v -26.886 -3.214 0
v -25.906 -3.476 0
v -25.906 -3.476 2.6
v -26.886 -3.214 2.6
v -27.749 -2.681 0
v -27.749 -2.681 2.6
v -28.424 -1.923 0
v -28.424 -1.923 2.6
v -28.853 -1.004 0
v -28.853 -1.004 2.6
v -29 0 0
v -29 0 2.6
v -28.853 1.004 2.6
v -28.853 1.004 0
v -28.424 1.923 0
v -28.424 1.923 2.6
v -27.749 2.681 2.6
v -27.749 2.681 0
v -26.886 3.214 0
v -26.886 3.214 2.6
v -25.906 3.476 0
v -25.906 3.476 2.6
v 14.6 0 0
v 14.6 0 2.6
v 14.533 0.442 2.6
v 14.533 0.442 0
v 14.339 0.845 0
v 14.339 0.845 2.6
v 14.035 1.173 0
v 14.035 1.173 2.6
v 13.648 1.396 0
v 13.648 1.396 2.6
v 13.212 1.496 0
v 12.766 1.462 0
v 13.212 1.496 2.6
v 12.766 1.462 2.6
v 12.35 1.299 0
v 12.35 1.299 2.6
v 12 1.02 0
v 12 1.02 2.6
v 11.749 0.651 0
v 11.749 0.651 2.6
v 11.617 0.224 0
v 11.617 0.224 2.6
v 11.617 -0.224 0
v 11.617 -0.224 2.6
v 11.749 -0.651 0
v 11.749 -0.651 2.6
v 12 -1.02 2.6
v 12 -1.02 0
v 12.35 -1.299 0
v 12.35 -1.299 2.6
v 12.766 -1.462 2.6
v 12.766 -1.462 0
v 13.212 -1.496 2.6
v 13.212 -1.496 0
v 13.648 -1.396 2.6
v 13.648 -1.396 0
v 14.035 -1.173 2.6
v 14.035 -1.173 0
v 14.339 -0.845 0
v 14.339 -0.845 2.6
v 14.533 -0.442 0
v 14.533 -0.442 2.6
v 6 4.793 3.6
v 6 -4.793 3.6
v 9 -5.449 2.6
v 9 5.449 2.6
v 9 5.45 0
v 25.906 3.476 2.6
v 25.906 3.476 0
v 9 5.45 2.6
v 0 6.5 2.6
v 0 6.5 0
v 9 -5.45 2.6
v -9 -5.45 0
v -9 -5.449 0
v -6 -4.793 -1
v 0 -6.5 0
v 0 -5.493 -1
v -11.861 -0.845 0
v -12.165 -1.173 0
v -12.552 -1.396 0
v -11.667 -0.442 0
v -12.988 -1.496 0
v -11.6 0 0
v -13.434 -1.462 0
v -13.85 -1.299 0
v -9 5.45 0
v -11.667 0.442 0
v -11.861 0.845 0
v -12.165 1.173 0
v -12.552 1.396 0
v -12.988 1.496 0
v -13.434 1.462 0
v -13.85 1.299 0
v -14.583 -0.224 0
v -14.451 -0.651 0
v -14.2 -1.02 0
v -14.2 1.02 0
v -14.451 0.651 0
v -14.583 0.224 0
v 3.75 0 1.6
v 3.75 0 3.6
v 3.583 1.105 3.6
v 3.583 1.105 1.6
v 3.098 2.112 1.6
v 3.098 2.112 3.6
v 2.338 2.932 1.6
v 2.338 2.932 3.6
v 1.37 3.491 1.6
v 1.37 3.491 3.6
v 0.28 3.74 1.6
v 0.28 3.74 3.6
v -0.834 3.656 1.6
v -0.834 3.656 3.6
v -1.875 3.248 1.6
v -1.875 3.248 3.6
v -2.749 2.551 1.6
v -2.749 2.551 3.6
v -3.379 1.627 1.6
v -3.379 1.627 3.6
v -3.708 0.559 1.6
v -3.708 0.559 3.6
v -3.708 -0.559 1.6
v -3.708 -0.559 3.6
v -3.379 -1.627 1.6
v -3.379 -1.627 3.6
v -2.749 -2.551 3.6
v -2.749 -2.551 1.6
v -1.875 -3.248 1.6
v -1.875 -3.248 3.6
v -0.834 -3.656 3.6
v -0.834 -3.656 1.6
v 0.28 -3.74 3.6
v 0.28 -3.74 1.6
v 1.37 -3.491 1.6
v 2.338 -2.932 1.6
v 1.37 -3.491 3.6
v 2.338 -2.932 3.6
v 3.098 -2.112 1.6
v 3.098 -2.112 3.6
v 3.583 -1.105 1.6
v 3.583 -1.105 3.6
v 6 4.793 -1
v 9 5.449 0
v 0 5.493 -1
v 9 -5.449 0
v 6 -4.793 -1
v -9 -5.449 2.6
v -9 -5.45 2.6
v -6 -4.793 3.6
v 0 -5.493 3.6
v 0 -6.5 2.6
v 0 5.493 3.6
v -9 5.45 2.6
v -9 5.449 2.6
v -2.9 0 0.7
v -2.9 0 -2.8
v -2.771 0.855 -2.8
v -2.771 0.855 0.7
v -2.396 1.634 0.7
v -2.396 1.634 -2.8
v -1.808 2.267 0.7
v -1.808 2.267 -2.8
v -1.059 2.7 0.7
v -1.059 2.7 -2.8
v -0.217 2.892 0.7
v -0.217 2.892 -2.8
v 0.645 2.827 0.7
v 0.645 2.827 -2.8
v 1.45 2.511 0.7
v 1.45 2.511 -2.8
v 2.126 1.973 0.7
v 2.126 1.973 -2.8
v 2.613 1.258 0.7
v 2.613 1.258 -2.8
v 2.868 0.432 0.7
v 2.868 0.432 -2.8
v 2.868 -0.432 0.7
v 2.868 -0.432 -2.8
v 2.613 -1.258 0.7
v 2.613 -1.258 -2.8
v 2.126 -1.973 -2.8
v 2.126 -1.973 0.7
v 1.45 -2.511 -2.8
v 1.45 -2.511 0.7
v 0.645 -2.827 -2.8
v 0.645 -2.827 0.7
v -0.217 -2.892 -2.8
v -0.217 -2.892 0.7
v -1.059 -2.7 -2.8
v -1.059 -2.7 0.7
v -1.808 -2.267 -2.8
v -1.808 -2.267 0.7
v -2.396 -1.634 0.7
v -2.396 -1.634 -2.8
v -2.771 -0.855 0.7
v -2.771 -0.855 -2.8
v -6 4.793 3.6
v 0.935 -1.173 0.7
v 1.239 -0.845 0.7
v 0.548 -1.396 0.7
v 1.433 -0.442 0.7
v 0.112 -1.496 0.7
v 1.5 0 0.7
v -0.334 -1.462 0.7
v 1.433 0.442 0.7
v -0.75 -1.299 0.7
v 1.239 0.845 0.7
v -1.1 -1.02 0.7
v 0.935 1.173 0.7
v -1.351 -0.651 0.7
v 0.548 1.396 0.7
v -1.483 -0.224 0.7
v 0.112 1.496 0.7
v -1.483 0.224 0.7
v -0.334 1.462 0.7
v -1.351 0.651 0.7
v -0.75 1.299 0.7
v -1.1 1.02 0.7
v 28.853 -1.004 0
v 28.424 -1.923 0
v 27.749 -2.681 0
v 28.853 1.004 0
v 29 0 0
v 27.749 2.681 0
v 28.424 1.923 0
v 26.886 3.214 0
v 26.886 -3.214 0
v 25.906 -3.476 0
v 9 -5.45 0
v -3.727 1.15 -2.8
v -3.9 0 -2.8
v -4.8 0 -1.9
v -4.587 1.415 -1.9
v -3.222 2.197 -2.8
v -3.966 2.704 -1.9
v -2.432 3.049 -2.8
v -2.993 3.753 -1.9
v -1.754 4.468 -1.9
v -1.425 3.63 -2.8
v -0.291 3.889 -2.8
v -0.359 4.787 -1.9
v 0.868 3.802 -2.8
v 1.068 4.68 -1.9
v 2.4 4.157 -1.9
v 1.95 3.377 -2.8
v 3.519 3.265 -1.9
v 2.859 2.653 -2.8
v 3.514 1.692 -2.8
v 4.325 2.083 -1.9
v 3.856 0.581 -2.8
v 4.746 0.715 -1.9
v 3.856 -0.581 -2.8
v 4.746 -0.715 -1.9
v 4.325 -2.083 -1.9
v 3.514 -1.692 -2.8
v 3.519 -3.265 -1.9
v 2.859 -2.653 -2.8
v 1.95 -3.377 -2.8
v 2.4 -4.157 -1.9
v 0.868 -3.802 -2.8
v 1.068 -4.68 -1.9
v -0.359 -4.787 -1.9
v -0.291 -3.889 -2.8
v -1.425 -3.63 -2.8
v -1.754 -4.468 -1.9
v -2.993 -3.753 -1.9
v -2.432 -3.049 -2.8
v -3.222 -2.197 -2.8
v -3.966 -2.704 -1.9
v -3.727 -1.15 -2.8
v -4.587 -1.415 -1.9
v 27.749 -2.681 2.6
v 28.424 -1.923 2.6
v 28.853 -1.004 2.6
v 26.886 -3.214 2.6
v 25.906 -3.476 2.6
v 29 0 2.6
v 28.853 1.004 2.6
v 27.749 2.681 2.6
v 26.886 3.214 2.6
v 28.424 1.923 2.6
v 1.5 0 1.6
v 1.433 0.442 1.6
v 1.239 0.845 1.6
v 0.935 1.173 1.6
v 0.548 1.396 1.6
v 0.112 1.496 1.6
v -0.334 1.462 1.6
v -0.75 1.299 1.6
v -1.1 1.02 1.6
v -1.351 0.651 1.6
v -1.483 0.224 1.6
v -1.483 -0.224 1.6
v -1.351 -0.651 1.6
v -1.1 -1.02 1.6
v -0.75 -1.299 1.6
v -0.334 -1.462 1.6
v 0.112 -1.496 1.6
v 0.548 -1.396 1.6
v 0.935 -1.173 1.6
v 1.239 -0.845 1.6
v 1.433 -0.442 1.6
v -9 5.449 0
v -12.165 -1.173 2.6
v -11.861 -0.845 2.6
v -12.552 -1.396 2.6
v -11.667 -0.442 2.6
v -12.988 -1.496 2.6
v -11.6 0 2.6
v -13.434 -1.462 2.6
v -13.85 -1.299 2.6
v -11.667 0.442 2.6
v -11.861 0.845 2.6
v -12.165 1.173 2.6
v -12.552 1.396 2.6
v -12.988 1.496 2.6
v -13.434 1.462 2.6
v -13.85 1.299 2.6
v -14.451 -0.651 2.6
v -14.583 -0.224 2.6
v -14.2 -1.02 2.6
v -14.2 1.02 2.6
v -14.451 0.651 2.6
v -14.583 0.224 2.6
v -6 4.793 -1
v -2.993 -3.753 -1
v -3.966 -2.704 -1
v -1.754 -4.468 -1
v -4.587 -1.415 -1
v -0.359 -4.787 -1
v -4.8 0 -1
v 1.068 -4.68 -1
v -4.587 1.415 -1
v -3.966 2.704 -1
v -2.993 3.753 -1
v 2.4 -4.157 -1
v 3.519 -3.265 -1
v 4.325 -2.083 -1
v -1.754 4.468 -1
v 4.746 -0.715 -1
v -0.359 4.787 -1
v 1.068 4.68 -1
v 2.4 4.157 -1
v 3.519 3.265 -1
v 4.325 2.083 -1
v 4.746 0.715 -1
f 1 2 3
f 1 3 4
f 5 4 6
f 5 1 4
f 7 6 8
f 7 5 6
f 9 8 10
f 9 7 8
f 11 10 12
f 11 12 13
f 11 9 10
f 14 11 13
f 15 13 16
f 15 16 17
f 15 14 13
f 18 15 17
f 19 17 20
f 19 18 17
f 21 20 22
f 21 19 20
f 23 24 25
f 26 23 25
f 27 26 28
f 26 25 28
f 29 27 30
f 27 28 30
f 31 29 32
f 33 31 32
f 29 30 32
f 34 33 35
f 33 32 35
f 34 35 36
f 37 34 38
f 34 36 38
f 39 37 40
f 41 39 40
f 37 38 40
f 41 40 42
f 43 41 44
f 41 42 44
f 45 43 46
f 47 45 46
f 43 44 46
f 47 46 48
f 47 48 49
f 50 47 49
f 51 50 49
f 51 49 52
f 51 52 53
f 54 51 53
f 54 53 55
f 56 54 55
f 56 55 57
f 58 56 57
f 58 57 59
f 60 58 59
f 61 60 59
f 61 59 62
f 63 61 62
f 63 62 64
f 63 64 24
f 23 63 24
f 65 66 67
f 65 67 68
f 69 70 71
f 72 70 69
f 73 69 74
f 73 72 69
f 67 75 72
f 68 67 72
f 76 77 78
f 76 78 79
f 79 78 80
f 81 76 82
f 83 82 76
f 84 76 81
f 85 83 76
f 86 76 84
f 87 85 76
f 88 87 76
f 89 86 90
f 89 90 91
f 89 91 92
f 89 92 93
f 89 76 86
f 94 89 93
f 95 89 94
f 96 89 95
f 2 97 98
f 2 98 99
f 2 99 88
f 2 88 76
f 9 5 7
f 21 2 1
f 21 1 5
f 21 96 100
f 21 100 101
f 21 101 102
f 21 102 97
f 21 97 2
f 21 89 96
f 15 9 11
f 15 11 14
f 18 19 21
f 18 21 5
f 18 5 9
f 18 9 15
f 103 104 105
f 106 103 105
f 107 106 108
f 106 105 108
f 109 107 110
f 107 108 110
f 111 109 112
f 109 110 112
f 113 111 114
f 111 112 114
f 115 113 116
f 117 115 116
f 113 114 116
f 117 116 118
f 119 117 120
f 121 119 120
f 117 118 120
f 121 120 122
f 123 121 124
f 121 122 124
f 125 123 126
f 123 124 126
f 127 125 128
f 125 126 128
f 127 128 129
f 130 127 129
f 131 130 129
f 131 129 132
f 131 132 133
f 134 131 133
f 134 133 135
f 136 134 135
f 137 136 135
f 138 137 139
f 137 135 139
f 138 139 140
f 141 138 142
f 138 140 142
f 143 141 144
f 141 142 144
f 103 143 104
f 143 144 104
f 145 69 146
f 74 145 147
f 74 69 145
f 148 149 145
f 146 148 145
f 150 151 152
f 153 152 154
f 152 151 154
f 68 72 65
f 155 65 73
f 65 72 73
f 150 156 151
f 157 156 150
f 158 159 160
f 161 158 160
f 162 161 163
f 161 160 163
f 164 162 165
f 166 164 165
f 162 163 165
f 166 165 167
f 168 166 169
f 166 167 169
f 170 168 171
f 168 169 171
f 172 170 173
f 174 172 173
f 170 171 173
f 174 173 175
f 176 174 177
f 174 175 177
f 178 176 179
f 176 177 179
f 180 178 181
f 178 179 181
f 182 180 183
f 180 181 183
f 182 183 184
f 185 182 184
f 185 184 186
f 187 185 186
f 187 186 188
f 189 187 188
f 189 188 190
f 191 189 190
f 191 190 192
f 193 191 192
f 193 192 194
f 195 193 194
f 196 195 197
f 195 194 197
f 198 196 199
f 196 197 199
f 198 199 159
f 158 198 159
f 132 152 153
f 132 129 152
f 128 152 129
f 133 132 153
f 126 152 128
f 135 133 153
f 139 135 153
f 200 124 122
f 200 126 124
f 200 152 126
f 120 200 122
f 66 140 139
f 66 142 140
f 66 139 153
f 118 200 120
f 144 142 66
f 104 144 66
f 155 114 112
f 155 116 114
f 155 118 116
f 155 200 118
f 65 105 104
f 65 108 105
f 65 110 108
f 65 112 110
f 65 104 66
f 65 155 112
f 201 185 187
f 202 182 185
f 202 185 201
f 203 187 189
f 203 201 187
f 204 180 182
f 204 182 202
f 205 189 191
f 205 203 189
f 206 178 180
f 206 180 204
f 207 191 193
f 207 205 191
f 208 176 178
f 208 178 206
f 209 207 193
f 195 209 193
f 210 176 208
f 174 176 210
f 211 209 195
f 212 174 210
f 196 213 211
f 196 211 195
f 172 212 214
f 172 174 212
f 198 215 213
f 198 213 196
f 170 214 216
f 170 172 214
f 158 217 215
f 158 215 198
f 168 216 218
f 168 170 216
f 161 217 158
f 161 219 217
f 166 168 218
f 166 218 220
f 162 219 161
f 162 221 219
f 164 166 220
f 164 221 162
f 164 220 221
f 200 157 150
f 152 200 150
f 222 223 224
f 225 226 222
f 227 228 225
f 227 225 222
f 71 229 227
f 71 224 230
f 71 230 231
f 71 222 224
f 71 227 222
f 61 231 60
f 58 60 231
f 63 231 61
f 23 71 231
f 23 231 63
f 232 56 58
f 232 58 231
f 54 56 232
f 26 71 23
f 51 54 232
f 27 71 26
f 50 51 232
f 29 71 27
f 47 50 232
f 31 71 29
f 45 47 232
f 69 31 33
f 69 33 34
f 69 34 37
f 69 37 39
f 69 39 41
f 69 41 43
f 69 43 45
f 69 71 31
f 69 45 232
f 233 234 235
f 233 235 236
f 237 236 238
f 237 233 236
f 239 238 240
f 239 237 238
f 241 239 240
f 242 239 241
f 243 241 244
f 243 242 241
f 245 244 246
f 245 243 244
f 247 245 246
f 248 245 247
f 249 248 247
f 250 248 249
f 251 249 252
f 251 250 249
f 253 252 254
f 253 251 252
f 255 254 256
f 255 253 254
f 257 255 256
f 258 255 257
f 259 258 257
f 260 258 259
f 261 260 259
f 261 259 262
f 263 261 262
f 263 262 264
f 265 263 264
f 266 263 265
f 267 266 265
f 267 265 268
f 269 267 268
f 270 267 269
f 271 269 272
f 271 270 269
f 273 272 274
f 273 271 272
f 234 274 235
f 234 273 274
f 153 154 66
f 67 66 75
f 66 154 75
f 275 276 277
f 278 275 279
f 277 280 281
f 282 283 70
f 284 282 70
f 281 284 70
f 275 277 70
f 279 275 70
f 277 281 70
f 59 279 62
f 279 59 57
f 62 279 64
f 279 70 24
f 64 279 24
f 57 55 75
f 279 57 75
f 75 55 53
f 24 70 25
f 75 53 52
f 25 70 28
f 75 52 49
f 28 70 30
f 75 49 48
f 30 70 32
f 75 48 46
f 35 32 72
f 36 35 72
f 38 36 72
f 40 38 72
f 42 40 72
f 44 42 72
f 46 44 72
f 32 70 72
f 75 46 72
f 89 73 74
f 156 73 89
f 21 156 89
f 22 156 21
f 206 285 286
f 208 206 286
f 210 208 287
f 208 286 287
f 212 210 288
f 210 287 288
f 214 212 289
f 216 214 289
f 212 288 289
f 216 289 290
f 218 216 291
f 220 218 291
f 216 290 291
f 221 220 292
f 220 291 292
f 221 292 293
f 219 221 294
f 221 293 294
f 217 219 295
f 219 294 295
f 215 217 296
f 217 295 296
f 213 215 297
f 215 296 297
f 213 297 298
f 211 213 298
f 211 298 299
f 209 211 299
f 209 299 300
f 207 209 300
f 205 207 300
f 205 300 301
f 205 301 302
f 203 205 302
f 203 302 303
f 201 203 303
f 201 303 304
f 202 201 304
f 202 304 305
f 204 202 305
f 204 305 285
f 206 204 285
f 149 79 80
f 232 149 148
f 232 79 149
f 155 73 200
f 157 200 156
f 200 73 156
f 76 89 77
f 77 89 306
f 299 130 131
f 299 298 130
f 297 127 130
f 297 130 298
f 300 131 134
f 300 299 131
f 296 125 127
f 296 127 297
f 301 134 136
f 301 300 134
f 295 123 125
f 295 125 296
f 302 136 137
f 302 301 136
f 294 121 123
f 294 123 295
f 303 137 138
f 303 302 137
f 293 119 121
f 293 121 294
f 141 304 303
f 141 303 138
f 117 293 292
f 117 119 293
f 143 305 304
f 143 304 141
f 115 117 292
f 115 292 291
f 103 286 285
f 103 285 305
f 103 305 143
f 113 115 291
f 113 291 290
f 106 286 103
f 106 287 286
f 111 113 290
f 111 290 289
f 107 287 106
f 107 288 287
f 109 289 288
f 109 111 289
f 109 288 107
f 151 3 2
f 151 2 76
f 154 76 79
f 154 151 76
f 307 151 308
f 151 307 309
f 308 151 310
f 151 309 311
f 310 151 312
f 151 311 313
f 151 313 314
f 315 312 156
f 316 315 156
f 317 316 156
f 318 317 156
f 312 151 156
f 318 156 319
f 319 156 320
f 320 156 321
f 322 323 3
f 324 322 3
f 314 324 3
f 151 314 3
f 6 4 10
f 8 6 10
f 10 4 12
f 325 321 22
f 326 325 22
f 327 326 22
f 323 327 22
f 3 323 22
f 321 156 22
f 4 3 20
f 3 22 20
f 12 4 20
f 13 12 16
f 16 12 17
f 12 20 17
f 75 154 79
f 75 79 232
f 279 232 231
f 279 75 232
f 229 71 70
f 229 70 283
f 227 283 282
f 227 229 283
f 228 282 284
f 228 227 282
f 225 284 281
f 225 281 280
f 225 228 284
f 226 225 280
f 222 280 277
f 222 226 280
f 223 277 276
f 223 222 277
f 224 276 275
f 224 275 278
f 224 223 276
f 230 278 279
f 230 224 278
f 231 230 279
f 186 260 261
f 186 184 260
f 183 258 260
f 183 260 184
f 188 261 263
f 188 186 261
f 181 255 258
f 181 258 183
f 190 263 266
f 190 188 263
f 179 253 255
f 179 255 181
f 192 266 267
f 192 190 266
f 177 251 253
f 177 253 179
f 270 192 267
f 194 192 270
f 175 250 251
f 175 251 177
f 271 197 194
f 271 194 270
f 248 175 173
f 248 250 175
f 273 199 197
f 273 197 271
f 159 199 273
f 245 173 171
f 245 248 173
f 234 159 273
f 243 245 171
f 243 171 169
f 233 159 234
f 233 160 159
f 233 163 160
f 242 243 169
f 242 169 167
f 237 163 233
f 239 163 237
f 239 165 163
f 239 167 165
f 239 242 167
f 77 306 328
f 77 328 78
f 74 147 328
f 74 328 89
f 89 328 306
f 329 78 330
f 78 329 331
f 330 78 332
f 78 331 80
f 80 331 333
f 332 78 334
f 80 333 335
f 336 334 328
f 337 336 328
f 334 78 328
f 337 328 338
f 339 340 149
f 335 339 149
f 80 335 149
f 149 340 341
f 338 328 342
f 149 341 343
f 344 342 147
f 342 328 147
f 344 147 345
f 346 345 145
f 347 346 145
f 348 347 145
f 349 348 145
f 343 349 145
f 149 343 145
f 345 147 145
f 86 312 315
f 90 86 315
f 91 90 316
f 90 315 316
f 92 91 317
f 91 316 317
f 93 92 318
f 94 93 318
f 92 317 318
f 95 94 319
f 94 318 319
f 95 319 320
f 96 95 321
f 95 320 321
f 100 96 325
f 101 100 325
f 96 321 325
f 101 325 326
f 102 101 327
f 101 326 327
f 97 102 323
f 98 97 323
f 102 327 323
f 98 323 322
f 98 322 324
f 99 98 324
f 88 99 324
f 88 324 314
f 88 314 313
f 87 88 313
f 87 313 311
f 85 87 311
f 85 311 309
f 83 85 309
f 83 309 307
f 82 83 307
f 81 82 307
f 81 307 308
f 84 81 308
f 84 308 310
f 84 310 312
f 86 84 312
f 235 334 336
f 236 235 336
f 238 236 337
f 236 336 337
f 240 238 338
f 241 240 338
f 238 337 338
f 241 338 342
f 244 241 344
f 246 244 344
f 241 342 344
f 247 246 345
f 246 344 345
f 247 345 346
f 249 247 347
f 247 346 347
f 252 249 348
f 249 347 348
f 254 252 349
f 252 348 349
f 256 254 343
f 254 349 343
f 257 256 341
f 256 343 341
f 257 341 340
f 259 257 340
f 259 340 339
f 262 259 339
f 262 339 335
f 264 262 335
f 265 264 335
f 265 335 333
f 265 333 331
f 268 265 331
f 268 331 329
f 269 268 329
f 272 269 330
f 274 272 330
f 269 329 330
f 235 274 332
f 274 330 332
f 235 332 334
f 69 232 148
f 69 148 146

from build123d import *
from OCP.BRepFilletAPI import BRepFilletAPI_MakeChamfer

# Parameters (mm, degrees)
EXTRUDE_1_DEPTH     = 2.6
SKETCH_8_R          = 1.4999999999999987
CUT_EXTRUDE_4_DEPTH = 30.833035380262615
EXTRUDE_2_DEPTH     = 1
CHAMFER_1_SIZE      = 1
CHAMFER_2_SIZE      = 1
CHAMFER_2_SIZE_2    = 3
EXTRUDE_3_DEPTH     = 1
SKETCH_3_R          = 1.5
CUT_EXTRUDE_1_DEPTH = 31.073410182418638
SKETCH_4_R          = 3.75
CUT_EXTRUDE_2_DEPTH = 2
CHAMFER_3_SIZE      = 1
CHAMFER_4_SIZE      = 1
CHAMFER_4_SIZE_2    = 3
SKETCH_6_R          = 4.8
EXTRUDE_4_DEPTH     = 1.8000000000000007
CHAMFER_5_SIZE      = 0.9
SKETCH_7_R          = 2.9
CUT_EXTRUDE_3_DEPTH = 3.5


with BuildPart() as part:
    # ｽｹｯﾁ1 → ﾎﾞｽ - 押し出し1 (new body)
    with BuildSketch(Plane.XY):
        with BuildLine():
            Line((8e-16, 6.5), (25.905749403157248, 3.4764015046938295))
            ThreePointArc((25.905749403157248, 3.4764015046938295), (28.999999999999996, 6.4e-16), (25.905749403157248, -3.476401504693828))
            Line((25.905749403157248, -3.476401504693828), (8e-16, -6.5))
            Line((8e-16, -6.5), (-25.905749403157248, -3.476401504693854))
            ThreePointArc((-25.905749403157248, -3.476401504693854), (-29.000000000000018, -6.03e-15), (-25.905749403157248, 3.4764015046938423))
            Line((-25.905749403157248, 3.4764015046938423), (8e-16, 6.5))
        make_face()
    extrude(amount=EXTRUDE_1_DEPTH)

    # ｽｹｯﾁ8 → ｶｯﾄ - 押し出し4 (cut, through all)
    with BuildSketch(Plane.XY.offset(2.6)):
        with Locations((13.1, 0)):
            Circle(SKETCH_8_R)
        with Locations((-13.1, -1.6e-15)):
            Circle(SKETCH_8_R)
    extrude(amount=-CUT_EXTRUDE_4_DEPTH, mode=Mode.SUBTRACT)

    # ｽｹｯﾁ2 → ﾎﾞｽ - 押し出し2 (add)
    with BuildSketch(Plane.XY.offset(2.6)):
        Polygon((-9.000000000000002, 5.4495618893604005), (-9.000000000000002, -5.449561889360406), (8e-16, -6.5), (9, -5.4495618893604), (9, 5.449561889360396), (8e-16, 6.5), align=None)
    extrude(amount=EXTRUDE_2_DEPTH)

    # 面取り1
    chamfer_1_edges = [part.edges().sort_by_distance(p)[0] for p in [
        (4.500000000000001, -5.9747809446802, 3.6),
        (-4.500000000000001, -5.974780944680203, 3.6),
        (-4.5, 5.9747809446802, 3.6),
        (4.5, 5.974780944680198, 3.6),
    ]]
    chamfer(chamfer_1_edges, length=CHAMFER_1_SIZE)

    # 面取り2
    chamfer_2_edges_1 = [part.edges().sort_by_distance(p)[0] for p in [
        (9, 0, 3.6),
    ]]
    chamfer_2_side_1 = [part.faces().sort_by_distance(p)[0] for p in [
        (9, 0, 3.58),
    ]]
    chamfer_2_edges_2 = [part.edges().sort_by_distance(p)[0] for p in [
        (-9.000000000000002, -8.9e-16, 3.6),
    ]]
    chamfer_2_side_2 = [part.faces().sort_by_distance(p)[0] for p in [
        (-8.980000000000002, -8.9e-16, 3.6),
    ]]
    chamfer_2 = BRepFilletAPI_MakeChamfer(part.part.solid().wrapped)
    for e in chamfer_2_edges_1:
        chamfer_2.Add(CHAMFER_2_SIZE - 0.0001, CHAMFER_2_SIZE_2 - 0.0001, e.wrapped, chamfer_2_side_1[0].wrapped)
    for e in chamfer_2_edges_2:
        chamfer_2.Add(CHAMFER_2_SIZE_2 - 0.0001, CHAMFER_2_SIZE - 0.0001, e.wrapped, chamfer_2_side_2[0].wrapped)
    add(Compound.cast(chamfer_2.Shape()), mode=Mode.REPLACE)  # a hair under: the kernel refuses the full size

    # ｽｹｯﾁ5 → ﾎﾞｽ - 押し出し3 (add)
    with BuildSketch(Plane(origin=(0, 0, 0), x_dir=(-1, 0, 0), z_dir=(0, 0, -1))):
        Polygon((8.999999999999998, 5.449561889360397), (9, -5.449561889360403), (-8e-16, -6.5), (-9, -5.449561889360396), (-9, 5.449561889360396), (-8e-16, 6.5), align=None)
    extrude(amount=EXTRUDE_3_DEPTH)

    # ｽｹｯﾁ3 → ｶｯﾄ - 押し出し1 (cut, through all)
    with BuildSketch(Plane.XY.offset(3.6)):
        Circle(SKETCH_3_R)
    extrude(amount=-CUT_EXTRUDE_1_DEPTH, mode=Mode.SUBTRACT)

    # ｽｹｯﾁ4 → ｶｯﾄ - 押し出し2 (cut)
    with BuildSketch(Plane.XY.offset(3.6)):
        Circle(SKETCH_4_R)
    extrude(amount=-CUT_EXTRUDE_2_DEPTH, mode=Mode.SUBTRACT)

    # 面取り3
    chamfer_3_edges = [part.edges().sort_by_distance(p)[0] for p in [
        (-4.499999999999998, 5.974780944680198, -1),
        (4.5, 5.974780944680198, -1),
        (4.500000000000001, -5.974780944680198, -1),
        (-4.5, -5.974780944680202, -1),
    ]]
    chamfer(chamfer_3_edges, length=CHAMFER_3_SIZE)

    # 面取り4
    chamfer_4_edges_1 = [part.edges().sort_by_distance(p)[0] for p in [
        (9, 0, -1),
    ]]
    chamfer_4_side_1 = [part.faces().sort_by_distance(p)[0] for p in [
        (9, 0, -0.98),
    ]]
    chamfer_4_edges_2 = [part.edges().sort_by_distance(p)[0] for p in [
        (-8.999999999999998, -1.78e-15, -1),
    ]]
    chamfer_4_side_2 = [part.faces().sort_by_distance(p)[0] for p in [
        (-8.979999999999999, -1.78e-15, -1),
    ]]
    chamfer_4 = BRepFilletAPI_MakeChamfer(part.part.solid().wrapped)
    for e in chamfer_4_edges_1:
        chamfer_4.Add(CHAMFER_4_SIZE - 0.0001, CHAMFER_4_SIZE_2 - 0.0001, e.wrapped, chamfer_4_side_1[0].wrapped)
    for e in chamfer_4_edges_2:
        chamfer_4.Add(CHAMFER_4_SIZE_2 - 0.0001, CHAMFER_4_SIZE - 0.0001, e.wrapped, chamfer_4_side_2[0].wrapped)
    add(Compound.cast(chamfer_4.Shape()), mode=Mode.REPLACE)  # a hair under: the kernel refuses the full size

    # ｽｹｯﾁ6 → ﾎﾞｽ - 押し出し4 (add)
    with BuildSketch(Plane(origin=(0, 0, -1), x_dir=(-1, 0, 0), z_dir=(0, 0, -1))):
        Circle(SKETCH_6_R)
    extrude(amount=EXTRUDE_4_DEPTH)

    # 面取り5
    chamfer_5_edges = [part.edges().sort_by_distance(p)[0] for p in [
        (4.800000000000001, -2.88e-15, -2.8000000000000007),
    ]]
    chamfer(chamfer_5_edges, length=CHAMFER_5_SIZE)

    # ｽｹｯﾁ7 → ｶｯﾄ - 押し出し3 (cut)
    with BuildSketch(Plane(origin=(0, 0, -2.8000000000000007), x_dir=(-1, 0, 0), z_dir=(0, 0, -1))):
        Circle(SKETCH_7_R)
    extrude(amount=-CUT_EXTRUDE_3_DEPTH, mode=Mode.SUBTRACT)


solid = part.part
